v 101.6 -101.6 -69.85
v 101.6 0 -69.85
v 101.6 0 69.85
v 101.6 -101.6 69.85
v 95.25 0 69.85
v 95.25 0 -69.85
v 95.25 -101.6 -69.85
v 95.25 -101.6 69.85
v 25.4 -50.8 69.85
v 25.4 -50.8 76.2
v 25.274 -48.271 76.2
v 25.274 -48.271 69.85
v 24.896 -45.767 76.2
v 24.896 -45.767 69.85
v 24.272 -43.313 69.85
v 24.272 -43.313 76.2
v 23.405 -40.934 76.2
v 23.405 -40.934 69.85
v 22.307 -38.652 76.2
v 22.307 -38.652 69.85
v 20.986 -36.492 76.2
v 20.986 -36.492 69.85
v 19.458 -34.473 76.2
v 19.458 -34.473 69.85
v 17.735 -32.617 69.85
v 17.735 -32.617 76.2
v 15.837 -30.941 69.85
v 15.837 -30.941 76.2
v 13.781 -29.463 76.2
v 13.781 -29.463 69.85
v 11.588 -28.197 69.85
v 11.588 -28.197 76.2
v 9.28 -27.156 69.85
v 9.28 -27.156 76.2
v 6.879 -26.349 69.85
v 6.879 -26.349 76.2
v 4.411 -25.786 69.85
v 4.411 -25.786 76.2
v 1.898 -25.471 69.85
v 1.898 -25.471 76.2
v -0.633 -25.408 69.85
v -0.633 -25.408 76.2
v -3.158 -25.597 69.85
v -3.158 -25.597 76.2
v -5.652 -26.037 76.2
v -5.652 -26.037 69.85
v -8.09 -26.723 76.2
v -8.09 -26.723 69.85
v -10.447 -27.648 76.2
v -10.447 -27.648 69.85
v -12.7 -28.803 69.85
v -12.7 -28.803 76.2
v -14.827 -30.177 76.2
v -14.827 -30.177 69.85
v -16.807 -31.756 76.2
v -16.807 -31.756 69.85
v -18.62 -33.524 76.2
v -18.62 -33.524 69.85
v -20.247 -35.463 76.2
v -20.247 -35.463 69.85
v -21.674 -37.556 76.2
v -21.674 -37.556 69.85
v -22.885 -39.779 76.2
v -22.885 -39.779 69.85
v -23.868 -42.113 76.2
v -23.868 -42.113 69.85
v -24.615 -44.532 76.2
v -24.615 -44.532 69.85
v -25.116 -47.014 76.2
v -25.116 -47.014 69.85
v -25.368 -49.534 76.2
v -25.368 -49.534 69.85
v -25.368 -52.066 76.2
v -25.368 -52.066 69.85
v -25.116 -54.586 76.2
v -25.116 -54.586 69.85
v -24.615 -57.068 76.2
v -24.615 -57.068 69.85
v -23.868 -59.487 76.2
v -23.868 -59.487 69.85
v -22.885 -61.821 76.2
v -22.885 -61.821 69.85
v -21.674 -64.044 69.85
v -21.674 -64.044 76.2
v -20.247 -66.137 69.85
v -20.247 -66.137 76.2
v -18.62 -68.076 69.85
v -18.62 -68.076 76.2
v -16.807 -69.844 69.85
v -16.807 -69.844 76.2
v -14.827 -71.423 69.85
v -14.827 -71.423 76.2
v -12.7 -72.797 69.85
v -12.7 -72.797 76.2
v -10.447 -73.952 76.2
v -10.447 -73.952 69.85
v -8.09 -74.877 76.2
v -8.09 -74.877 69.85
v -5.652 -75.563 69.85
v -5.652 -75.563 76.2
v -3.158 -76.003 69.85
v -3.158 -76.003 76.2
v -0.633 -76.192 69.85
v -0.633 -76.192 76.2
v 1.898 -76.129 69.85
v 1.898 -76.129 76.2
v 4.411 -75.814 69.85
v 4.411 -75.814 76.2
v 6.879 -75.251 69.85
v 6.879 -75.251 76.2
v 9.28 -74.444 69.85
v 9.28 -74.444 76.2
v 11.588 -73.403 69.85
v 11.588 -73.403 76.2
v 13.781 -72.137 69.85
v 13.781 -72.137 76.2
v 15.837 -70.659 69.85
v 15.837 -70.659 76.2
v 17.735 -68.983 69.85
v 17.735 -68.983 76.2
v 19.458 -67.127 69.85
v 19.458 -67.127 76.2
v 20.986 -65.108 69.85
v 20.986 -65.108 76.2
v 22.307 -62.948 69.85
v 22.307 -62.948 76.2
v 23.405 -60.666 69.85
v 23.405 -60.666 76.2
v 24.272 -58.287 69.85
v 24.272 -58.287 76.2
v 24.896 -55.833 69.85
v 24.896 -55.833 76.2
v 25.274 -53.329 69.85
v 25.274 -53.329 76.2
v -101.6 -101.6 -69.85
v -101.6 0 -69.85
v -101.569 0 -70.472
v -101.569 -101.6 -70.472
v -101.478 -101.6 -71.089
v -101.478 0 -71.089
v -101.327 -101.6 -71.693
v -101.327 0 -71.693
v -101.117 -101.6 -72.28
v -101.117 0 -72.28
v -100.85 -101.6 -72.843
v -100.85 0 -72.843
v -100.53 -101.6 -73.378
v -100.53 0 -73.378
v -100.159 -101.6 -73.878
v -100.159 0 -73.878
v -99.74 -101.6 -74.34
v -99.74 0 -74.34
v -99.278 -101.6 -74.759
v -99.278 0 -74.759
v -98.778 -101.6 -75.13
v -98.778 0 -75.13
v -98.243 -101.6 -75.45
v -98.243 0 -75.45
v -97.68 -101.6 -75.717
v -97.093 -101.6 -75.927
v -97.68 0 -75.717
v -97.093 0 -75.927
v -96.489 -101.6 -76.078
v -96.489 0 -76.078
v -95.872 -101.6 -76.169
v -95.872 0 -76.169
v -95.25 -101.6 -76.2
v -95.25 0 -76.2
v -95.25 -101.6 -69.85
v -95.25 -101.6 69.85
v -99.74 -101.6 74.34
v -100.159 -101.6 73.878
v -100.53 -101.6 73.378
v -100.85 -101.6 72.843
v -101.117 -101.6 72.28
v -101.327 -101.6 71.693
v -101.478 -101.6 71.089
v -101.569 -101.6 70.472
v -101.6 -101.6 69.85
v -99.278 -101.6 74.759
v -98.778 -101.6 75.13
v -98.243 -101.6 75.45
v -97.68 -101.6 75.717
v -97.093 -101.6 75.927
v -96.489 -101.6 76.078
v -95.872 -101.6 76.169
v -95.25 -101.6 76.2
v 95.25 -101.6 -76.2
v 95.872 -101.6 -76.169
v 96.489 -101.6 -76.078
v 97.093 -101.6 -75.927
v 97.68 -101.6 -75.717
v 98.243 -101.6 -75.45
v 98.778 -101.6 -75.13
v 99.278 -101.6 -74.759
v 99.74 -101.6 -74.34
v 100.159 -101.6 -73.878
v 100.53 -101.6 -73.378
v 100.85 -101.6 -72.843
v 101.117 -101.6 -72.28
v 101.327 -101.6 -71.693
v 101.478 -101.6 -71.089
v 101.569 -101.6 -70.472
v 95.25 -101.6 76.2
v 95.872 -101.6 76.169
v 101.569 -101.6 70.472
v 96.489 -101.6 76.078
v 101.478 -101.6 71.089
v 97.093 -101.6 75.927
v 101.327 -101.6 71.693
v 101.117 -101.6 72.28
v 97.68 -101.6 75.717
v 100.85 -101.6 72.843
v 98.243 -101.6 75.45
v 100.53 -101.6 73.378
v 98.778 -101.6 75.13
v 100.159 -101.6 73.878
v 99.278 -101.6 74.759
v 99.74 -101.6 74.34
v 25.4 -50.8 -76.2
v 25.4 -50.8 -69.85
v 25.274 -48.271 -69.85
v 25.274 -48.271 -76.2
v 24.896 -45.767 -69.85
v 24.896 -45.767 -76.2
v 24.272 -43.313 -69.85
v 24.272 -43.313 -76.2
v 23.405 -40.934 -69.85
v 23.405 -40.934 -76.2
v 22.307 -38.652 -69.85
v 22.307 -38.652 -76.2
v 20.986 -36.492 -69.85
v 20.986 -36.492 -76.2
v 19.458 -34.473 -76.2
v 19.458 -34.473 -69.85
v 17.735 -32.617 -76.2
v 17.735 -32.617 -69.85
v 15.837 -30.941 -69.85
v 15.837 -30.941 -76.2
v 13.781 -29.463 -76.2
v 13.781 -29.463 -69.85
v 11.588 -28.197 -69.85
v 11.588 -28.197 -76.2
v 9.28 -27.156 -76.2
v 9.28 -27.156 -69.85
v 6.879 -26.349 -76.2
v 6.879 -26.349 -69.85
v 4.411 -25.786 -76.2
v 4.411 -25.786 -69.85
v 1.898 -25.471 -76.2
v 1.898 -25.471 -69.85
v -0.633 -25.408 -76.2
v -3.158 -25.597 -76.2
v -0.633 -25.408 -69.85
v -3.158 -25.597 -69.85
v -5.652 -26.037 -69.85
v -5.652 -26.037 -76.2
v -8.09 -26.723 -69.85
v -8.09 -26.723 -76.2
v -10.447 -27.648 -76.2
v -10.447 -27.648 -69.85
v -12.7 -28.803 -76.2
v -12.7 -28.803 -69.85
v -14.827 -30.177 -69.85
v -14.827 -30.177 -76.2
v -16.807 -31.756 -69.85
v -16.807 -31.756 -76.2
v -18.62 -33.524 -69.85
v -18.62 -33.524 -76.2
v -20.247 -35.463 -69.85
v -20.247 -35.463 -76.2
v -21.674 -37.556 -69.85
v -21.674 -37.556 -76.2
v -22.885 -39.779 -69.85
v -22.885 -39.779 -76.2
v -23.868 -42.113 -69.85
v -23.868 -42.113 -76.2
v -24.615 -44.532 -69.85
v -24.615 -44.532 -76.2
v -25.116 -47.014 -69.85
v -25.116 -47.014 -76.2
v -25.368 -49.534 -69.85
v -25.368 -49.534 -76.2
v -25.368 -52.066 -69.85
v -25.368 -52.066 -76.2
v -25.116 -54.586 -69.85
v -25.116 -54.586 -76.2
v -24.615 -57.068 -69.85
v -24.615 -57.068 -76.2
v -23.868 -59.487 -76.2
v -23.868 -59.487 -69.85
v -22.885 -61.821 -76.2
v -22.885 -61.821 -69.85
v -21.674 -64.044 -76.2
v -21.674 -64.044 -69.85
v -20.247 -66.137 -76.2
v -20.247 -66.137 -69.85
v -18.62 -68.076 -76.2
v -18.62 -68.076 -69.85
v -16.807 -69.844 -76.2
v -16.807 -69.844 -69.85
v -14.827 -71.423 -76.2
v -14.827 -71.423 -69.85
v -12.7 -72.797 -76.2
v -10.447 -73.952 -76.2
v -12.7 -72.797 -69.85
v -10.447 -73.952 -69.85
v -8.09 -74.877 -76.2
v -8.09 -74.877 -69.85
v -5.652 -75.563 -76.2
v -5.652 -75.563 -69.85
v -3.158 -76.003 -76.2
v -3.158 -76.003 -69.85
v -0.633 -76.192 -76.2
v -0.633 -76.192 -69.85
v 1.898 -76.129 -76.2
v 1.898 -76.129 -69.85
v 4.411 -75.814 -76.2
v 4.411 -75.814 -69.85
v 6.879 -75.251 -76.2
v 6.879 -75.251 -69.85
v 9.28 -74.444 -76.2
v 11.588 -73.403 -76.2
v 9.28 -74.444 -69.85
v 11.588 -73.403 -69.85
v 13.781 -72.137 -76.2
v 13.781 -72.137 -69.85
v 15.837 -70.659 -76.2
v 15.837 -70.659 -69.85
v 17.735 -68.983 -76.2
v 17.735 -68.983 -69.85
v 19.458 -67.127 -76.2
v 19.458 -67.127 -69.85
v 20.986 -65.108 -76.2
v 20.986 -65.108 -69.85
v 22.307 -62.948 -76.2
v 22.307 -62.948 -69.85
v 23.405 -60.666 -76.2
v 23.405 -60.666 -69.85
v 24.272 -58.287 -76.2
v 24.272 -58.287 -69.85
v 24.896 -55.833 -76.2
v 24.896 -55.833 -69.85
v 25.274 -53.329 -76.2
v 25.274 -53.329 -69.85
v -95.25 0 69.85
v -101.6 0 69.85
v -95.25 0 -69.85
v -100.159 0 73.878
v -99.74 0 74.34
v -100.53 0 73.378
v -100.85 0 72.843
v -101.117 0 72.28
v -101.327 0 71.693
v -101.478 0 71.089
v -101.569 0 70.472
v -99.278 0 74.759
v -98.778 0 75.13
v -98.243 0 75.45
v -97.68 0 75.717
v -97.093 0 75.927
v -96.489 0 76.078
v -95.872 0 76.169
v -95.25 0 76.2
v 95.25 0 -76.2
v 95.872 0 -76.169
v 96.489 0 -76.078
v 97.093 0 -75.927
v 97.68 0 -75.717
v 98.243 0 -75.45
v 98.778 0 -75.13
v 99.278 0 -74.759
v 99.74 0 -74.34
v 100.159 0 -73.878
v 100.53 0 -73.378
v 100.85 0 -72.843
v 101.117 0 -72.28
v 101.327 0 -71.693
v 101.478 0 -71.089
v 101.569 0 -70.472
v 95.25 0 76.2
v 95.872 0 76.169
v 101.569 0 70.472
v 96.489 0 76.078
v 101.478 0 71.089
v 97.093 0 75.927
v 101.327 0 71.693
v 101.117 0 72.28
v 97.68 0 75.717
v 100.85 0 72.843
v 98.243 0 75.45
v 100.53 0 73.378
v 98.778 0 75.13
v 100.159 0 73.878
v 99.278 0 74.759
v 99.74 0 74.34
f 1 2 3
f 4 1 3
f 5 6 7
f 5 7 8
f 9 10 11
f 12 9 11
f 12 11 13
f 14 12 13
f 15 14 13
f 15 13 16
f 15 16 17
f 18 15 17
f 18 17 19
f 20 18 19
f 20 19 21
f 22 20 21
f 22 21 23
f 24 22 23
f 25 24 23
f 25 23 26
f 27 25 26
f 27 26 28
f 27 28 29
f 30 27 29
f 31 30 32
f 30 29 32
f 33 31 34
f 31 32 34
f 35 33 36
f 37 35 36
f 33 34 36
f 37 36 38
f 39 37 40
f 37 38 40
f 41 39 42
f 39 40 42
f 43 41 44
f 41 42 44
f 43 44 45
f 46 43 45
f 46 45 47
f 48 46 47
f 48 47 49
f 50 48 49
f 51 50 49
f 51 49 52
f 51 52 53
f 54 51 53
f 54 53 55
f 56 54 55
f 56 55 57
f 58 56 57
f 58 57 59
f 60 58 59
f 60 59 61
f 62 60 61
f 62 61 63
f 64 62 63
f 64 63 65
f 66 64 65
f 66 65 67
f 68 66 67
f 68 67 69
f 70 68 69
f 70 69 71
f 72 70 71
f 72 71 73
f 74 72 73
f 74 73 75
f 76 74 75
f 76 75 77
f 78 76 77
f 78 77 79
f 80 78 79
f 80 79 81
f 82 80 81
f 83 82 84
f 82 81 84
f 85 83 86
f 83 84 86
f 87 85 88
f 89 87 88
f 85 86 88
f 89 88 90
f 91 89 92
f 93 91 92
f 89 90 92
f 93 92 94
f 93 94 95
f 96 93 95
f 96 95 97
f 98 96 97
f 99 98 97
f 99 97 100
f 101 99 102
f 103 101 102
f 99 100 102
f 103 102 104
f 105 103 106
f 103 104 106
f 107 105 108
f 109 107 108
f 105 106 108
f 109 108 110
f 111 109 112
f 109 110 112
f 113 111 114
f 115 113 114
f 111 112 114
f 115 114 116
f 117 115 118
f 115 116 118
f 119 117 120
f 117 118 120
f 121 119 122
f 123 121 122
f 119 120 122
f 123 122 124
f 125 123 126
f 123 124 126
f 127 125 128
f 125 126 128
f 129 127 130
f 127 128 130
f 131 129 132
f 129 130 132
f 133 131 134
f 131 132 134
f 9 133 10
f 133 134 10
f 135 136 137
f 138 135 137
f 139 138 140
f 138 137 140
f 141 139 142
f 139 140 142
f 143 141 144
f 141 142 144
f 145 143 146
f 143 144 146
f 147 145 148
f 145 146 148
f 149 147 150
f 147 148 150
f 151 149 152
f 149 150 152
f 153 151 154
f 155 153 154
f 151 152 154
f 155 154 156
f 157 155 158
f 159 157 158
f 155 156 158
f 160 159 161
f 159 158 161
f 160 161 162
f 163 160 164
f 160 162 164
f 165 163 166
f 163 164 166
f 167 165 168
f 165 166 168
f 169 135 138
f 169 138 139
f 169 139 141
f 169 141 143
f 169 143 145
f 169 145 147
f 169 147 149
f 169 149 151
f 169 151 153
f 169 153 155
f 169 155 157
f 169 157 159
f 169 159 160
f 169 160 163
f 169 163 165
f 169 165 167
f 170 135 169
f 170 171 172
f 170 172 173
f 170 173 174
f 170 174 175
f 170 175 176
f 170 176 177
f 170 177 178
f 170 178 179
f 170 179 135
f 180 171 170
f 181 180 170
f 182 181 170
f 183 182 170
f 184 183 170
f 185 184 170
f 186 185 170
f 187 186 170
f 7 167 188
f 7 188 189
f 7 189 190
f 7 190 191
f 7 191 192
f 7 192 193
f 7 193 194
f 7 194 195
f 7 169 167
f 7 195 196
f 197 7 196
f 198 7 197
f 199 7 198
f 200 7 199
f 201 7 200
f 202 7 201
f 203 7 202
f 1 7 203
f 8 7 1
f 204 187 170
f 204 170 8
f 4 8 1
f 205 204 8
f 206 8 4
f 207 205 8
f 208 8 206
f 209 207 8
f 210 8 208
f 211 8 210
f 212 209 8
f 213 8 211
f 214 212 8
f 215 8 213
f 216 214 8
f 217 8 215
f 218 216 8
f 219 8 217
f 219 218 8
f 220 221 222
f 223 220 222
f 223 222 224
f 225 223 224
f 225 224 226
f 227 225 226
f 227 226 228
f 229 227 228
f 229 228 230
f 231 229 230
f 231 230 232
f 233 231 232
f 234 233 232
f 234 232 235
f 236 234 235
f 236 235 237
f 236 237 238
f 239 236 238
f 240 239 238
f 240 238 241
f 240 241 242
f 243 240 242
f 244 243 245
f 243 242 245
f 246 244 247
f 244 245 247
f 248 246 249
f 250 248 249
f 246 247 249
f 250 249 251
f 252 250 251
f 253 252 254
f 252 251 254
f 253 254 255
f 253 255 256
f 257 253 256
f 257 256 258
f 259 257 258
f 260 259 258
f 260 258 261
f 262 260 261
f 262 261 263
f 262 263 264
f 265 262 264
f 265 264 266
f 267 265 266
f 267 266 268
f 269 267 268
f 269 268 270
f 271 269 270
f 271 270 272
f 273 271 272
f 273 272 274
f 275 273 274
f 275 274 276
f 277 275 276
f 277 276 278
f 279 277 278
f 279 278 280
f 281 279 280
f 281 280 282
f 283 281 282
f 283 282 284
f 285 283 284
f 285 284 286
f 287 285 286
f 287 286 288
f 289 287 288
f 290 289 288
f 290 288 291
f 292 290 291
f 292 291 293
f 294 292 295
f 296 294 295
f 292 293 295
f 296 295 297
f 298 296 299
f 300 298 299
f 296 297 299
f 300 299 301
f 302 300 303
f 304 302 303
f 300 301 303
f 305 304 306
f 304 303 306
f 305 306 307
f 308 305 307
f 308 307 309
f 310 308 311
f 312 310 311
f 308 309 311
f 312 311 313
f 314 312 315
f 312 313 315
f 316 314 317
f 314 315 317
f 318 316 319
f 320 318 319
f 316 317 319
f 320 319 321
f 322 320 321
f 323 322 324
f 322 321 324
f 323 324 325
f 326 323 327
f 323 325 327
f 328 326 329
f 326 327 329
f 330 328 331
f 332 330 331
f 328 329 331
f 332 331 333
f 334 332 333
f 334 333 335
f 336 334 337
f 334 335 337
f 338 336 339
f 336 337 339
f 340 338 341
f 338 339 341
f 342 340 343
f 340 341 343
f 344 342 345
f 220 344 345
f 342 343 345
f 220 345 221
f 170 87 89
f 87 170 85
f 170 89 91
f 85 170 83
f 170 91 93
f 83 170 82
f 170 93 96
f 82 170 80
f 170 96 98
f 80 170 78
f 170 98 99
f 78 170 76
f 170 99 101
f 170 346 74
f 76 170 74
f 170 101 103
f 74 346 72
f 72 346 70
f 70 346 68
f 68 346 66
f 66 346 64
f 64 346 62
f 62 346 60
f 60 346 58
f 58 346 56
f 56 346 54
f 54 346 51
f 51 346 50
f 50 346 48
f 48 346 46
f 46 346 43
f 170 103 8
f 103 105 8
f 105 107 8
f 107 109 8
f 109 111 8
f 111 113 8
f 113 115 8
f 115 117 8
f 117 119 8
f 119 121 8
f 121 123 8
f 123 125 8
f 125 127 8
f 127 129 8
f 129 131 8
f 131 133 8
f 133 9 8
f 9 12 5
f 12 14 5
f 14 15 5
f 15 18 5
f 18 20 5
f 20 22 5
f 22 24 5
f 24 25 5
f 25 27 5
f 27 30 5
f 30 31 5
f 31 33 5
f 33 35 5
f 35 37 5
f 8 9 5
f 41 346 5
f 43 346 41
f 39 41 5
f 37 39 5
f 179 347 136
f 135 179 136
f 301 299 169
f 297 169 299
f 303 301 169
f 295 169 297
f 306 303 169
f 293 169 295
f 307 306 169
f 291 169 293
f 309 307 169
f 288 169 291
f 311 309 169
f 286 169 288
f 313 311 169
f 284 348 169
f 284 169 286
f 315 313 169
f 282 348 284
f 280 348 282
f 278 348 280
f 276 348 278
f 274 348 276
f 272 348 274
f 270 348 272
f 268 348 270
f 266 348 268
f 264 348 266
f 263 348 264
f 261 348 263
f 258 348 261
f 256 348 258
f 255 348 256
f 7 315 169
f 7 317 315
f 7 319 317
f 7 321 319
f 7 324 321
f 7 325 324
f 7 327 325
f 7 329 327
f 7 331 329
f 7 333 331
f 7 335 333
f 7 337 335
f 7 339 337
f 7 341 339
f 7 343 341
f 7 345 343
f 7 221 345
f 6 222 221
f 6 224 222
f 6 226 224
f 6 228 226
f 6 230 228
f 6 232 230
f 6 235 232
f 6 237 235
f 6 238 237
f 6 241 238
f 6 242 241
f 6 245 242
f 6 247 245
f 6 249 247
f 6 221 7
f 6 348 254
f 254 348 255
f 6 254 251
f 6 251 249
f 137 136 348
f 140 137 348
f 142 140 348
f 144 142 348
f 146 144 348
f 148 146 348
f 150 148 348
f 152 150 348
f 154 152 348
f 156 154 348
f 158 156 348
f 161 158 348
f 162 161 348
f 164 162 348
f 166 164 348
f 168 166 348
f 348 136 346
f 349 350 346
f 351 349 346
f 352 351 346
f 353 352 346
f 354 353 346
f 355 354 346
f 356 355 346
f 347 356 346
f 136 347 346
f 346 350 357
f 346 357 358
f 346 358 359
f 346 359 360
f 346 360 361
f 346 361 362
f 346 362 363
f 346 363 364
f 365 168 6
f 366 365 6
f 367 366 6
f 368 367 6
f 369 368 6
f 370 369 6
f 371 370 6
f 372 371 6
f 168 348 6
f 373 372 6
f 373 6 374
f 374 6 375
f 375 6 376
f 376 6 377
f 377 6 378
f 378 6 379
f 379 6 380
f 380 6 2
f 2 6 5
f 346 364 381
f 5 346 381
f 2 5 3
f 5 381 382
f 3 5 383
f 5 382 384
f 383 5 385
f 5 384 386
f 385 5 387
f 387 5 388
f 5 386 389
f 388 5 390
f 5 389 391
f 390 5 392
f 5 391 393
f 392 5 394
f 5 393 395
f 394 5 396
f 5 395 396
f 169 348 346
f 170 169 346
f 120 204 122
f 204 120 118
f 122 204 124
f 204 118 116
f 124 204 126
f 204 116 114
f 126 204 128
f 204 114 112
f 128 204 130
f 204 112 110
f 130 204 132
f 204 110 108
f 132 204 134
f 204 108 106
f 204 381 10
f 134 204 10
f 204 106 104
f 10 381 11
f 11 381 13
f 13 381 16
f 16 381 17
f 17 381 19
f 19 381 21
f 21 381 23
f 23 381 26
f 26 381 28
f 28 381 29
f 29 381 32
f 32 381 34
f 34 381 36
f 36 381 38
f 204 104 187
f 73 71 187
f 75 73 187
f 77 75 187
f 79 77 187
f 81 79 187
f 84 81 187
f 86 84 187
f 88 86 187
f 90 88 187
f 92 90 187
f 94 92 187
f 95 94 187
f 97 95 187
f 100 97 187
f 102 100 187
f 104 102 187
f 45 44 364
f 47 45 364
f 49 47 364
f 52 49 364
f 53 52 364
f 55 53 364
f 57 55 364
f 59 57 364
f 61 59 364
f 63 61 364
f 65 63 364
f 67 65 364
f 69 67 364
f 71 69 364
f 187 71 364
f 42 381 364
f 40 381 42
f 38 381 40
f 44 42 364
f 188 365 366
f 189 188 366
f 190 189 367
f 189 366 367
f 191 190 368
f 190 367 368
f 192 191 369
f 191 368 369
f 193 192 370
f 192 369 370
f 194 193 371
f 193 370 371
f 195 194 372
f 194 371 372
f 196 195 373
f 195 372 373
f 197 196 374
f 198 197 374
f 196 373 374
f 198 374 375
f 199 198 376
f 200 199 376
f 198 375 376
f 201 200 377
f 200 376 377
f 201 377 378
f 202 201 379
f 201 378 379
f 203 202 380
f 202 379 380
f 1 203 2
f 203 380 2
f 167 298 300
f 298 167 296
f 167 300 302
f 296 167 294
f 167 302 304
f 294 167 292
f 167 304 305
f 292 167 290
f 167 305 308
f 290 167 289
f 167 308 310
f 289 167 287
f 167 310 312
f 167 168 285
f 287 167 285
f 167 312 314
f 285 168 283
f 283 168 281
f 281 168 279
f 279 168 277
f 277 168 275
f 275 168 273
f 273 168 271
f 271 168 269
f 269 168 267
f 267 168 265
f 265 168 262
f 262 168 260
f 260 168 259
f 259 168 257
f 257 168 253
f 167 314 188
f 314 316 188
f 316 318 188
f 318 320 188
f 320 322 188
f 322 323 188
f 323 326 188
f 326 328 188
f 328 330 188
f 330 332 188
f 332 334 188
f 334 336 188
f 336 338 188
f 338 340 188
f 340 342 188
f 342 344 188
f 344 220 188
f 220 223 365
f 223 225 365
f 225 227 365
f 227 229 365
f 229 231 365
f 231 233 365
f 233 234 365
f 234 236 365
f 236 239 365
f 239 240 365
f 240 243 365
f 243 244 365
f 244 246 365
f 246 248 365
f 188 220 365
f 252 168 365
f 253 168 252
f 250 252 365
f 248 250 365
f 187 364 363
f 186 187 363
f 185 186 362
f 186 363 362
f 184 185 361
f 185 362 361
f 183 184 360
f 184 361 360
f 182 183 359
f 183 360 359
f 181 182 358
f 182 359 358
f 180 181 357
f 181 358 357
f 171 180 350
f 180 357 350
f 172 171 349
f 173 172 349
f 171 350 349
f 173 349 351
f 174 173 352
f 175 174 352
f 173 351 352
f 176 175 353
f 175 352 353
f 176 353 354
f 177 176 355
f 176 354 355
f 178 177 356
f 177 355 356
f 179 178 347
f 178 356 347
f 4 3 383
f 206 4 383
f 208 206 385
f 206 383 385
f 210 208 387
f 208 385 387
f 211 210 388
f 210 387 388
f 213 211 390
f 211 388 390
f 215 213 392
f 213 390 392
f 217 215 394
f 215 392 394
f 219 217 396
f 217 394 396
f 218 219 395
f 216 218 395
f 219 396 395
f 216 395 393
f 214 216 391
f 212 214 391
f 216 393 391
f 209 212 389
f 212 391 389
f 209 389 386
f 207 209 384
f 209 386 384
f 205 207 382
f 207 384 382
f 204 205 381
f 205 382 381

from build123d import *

# Parameters (mm, degrees)
F0_W     = 190.5
F0_H     = 139.7
F1_DEPTH = 101.6
F2_R     = 25.4
F3_DEPTH = 152.401


# Not quite as in the source:
# - ends of sketch curves that miss each other by under 0.0002 mm in the source are joined


with BuildPart() as f1:
    # F0 (on Front) → F1 (new body)
    with BuildSketch(Plane.XZ):
        with BuildLine():
            Line((-95.25, -76.2), (95.25, -76.2))
            ThreePointArc((95.25, -76.2), (99.7401280605, -74.3401280605), (101.6, -69.85))
            Line((101.6, -69.85), (101.6, 69.85))
            ThreePointArc((101.6, 69.85), (99.7401280605, 74.3401280605), (95.25, 76.2))
            Line((95.25, 76.2), (-95.25, 76.2))
            ThreePointArc((-95.25, 76.2), (-99.7401280605, 74.3401280605), (-101.6, 69.85))
            Line((-101.6, 69.85), (-101.6, -69.85))
            ThreePointArc((-101.6, -69.85), (-99.7401280605, -74.3401280605), (-95.25, -76.2))
        make_face()
        Rectangle(F0_W, F0_H, mode=Mode.SUBTRACT)
    extrude(amount=F1_DEPTH)

    # F2 (on face) → F3 (cut, through all)
    with BuildSketch(Plane.XY.offset(76.2)):
        with Locations((0, -50.8)):
            Circle(F2_R)
    extrude(amount=-F3_DEPTH, mode=Mode.SUBTRACT)


solid = f1.part
